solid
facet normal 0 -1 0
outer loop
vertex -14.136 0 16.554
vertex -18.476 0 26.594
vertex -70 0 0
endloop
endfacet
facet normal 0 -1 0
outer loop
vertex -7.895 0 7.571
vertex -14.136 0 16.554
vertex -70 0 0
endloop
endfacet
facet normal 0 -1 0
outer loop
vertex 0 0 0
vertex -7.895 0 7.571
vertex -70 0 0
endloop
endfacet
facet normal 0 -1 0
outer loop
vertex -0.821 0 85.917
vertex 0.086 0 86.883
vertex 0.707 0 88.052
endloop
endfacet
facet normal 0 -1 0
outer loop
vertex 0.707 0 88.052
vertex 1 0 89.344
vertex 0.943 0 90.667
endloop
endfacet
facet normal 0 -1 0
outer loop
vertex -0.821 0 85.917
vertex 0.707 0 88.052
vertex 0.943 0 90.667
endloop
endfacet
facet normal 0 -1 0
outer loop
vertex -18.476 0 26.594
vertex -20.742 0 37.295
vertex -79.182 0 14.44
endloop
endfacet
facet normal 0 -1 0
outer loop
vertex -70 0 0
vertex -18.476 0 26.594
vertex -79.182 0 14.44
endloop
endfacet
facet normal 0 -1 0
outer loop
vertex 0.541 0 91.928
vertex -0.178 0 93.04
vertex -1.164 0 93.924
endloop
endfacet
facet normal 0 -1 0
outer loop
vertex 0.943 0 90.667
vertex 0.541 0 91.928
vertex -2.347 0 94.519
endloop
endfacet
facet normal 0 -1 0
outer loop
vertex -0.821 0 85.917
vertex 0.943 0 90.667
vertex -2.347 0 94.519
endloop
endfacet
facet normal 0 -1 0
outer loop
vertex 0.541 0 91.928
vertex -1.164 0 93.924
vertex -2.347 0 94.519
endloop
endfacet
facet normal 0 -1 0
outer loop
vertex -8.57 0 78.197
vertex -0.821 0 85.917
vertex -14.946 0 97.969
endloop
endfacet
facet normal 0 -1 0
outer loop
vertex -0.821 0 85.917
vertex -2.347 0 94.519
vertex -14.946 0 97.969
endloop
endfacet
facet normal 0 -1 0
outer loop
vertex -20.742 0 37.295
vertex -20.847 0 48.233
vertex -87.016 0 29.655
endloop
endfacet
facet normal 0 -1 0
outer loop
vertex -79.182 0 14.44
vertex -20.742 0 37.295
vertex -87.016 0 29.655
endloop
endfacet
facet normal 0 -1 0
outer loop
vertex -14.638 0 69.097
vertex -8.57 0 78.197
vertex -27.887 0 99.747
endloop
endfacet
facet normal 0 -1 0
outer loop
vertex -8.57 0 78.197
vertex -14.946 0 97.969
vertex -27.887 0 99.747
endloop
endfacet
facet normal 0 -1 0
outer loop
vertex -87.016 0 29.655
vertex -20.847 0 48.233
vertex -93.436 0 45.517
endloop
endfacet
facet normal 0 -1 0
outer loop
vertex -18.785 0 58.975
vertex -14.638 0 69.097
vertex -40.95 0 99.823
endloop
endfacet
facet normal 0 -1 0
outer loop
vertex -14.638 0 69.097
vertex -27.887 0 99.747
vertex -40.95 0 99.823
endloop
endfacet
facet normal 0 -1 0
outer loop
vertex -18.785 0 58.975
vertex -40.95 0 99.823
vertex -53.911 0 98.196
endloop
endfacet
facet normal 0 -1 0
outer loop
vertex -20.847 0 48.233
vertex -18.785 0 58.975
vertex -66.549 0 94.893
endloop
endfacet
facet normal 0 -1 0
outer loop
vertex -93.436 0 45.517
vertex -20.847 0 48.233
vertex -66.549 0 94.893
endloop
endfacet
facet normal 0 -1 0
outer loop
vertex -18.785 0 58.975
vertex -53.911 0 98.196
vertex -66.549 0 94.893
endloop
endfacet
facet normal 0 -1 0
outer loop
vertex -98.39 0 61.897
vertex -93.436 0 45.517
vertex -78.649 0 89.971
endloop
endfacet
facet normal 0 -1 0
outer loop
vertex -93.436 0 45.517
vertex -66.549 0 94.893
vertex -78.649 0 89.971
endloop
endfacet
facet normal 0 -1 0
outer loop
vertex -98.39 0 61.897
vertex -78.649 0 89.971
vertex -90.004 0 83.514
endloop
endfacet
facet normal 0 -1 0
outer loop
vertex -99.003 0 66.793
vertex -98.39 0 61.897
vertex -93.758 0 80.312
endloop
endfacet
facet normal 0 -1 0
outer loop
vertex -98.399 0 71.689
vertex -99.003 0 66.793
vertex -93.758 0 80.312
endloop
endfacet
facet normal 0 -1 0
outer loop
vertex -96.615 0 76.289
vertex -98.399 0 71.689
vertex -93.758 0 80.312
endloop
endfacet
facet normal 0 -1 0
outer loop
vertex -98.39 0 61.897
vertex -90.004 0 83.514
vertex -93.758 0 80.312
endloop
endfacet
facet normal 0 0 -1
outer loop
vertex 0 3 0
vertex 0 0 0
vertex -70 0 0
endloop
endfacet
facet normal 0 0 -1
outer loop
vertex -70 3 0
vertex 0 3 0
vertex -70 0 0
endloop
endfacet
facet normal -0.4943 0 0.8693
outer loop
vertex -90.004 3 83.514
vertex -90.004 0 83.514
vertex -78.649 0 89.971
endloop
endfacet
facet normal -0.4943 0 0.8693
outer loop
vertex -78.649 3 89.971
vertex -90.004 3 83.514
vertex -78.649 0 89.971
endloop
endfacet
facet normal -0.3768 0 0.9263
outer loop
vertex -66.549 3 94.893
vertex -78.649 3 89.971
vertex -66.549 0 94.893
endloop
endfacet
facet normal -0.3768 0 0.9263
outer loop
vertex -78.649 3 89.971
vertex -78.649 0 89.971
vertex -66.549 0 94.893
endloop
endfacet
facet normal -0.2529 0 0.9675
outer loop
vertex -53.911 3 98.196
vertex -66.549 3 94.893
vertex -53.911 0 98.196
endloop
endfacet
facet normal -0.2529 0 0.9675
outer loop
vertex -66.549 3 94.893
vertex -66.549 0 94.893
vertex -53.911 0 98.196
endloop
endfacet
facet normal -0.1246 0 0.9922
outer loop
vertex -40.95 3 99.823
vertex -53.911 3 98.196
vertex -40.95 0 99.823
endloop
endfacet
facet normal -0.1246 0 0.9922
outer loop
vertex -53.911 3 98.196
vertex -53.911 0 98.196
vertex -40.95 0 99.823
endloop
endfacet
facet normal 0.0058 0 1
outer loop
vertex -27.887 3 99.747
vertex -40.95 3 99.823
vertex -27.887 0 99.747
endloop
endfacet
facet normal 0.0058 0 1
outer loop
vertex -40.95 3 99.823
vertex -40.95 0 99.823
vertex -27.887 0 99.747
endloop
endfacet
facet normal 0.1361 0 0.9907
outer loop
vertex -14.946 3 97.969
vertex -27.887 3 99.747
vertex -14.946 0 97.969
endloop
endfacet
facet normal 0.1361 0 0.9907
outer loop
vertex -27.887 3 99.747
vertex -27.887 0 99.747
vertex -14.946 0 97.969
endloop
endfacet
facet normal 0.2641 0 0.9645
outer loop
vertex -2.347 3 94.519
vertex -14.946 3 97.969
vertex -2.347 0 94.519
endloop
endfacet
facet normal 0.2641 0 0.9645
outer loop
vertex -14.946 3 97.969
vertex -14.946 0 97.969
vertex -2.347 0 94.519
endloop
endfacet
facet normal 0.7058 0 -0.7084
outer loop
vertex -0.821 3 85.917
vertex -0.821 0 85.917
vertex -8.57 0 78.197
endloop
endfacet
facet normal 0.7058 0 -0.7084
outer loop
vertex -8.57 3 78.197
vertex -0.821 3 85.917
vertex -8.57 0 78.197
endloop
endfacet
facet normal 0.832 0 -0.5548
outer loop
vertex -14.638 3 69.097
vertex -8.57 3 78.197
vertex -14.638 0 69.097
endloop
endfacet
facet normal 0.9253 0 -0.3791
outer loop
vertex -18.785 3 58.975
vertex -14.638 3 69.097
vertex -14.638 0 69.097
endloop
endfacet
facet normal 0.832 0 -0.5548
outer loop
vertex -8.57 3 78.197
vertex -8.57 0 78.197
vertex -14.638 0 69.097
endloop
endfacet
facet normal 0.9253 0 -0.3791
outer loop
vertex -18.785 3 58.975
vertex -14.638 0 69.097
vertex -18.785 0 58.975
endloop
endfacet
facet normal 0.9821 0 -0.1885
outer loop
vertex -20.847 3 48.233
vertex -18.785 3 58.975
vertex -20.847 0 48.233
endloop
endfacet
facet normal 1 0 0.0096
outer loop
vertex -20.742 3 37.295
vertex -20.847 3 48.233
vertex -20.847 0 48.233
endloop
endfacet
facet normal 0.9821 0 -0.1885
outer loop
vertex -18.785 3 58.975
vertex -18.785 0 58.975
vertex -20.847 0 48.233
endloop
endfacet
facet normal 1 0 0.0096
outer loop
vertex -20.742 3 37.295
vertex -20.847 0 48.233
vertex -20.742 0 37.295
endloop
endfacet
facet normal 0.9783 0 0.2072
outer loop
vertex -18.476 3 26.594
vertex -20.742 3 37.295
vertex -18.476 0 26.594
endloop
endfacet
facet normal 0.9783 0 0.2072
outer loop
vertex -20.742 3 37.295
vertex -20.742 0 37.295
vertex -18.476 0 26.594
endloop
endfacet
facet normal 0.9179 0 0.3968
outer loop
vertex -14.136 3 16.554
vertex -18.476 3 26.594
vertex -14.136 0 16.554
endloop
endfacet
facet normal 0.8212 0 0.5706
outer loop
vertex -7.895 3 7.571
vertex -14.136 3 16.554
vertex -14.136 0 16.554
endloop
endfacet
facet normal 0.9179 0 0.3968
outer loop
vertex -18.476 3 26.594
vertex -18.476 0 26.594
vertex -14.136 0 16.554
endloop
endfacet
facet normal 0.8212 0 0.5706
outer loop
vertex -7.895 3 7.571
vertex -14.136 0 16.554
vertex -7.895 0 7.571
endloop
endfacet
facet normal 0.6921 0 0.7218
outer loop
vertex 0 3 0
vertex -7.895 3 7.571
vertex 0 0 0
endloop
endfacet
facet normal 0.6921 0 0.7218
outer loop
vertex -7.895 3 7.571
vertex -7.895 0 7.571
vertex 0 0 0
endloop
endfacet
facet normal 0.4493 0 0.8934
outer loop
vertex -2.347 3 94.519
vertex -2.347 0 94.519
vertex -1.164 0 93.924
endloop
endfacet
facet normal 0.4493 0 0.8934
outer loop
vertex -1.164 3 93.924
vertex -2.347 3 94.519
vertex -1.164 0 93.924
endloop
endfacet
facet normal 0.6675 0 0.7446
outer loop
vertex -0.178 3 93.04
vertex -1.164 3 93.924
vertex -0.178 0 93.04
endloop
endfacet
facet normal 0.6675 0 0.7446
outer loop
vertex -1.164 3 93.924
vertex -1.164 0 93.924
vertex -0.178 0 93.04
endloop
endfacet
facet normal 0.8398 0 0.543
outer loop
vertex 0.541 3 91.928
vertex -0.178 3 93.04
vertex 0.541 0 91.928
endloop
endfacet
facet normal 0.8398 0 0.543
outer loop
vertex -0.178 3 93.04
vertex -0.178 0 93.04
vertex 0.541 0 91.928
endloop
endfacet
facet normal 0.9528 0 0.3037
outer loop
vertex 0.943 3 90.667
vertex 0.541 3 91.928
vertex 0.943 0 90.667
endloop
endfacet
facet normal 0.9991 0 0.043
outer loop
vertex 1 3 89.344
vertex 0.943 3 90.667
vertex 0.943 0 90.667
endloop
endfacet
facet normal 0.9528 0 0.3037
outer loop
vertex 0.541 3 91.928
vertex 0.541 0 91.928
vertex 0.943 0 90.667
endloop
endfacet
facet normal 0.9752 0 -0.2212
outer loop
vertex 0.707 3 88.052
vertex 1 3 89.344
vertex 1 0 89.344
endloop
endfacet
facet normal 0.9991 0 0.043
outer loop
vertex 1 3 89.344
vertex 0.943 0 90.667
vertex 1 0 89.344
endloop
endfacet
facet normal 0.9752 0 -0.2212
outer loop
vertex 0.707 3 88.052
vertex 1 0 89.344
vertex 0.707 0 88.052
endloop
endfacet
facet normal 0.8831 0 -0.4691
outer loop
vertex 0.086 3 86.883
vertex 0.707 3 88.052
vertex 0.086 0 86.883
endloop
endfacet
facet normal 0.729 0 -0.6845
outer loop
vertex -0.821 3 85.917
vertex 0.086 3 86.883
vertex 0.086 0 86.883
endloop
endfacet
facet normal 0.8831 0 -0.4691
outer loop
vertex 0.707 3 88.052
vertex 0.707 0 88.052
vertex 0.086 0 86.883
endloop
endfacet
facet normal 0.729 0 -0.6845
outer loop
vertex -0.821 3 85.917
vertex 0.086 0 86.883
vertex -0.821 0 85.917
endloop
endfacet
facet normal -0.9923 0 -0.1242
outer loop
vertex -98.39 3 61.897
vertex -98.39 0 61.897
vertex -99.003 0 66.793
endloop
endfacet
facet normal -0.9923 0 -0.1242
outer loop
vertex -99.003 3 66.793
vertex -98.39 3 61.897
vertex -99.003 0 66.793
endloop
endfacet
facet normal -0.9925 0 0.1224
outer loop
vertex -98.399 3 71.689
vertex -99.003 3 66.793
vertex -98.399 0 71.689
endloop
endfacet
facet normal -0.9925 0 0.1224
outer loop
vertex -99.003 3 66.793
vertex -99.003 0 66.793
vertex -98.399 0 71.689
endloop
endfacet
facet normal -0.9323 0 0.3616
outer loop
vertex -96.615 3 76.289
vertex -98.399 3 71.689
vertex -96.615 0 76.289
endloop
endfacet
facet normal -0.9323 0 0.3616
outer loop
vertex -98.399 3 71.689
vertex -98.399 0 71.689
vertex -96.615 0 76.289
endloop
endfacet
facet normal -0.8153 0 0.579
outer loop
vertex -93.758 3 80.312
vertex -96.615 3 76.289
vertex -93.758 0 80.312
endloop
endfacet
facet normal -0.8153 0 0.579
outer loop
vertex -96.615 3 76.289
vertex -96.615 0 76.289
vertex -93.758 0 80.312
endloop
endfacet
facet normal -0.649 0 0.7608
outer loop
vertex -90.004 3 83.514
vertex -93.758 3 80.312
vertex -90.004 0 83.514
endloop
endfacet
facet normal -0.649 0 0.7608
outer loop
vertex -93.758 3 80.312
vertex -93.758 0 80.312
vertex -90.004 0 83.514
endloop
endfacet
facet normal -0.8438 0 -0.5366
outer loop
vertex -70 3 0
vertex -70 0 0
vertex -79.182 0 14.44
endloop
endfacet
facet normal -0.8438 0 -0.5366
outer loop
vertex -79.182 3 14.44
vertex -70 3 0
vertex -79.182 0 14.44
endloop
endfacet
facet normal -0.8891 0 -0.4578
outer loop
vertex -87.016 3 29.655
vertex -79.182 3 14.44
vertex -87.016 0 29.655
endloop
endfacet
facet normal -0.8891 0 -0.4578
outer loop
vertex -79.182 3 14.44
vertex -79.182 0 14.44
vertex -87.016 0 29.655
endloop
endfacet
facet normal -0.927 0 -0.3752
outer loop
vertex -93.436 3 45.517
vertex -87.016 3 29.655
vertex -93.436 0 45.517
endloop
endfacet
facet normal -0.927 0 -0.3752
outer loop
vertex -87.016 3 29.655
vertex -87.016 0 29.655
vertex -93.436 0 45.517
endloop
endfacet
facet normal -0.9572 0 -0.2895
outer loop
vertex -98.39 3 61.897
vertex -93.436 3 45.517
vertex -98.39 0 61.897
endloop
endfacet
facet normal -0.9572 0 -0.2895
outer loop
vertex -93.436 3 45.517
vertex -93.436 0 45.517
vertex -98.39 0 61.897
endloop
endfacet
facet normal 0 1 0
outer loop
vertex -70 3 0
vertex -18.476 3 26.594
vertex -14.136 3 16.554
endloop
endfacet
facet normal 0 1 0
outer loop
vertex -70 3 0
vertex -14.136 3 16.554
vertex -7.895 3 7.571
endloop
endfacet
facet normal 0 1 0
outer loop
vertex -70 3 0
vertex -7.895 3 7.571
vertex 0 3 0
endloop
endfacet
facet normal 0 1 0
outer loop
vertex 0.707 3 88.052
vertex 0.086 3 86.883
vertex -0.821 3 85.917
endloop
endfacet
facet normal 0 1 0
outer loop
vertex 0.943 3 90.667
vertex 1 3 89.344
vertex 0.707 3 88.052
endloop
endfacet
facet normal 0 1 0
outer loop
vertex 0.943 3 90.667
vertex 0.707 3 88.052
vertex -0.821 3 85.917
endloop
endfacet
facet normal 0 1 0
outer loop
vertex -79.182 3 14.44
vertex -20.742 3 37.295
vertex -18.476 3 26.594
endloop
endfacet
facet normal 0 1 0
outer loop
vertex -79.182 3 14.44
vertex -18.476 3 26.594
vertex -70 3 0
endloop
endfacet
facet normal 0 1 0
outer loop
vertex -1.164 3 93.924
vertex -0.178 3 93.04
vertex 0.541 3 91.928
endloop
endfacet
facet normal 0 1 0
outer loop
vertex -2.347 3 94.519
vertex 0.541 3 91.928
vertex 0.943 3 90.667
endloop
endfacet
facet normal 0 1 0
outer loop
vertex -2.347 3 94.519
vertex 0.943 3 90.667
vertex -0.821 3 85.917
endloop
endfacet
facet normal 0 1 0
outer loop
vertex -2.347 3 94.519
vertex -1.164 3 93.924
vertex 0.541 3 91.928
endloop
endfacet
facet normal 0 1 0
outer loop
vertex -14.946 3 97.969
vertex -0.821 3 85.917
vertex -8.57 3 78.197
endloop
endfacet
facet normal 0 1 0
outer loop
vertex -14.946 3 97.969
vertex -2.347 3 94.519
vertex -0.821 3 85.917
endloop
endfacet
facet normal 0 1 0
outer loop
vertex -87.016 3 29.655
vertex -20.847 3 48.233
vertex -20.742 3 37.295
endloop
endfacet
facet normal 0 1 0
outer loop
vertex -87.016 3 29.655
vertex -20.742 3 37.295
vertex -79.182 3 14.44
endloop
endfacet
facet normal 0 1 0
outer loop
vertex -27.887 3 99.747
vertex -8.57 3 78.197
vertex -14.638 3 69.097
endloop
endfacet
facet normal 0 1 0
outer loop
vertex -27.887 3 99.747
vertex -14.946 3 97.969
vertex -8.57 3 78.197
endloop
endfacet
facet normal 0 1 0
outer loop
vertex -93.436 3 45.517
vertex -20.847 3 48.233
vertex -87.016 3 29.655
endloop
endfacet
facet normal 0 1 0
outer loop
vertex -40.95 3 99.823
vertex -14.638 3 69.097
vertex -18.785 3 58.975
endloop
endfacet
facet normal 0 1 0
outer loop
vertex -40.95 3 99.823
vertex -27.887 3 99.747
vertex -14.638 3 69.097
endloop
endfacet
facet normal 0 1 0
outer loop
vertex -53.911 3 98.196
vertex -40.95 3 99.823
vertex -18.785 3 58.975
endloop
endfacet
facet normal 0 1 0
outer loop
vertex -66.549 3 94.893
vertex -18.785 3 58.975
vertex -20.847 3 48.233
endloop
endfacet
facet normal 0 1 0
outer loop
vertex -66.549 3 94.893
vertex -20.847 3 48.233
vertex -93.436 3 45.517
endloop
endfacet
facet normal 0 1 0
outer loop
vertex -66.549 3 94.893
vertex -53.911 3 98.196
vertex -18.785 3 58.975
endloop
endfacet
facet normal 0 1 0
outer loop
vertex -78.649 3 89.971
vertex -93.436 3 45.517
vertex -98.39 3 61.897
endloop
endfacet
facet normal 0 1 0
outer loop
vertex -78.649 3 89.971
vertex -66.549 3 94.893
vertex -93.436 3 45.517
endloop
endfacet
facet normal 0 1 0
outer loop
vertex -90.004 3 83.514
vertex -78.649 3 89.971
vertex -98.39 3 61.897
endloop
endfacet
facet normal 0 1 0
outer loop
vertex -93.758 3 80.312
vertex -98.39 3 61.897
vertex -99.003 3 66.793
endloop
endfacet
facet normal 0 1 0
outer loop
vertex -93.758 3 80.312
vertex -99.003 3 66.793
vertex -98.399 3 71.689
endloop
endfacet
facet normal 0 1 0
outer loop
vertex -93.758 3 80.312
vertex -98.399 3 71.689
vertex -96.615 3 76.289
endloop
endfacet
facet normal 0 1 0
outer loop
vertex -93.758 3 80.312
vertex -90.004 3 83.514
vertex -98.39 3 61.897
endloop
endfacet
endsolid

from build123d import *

# Parameters (mm, degrees)
BOSS_EXTRUDE1_DEPTH = 3


with BuildPart() as part:
    # Sketch2 → Boss-Extrude1 (new body)
    with BuildSketch(Plane(origin=(0, 0, 0), x_dir=(-1, 0, 0), z_dir=(0, 1, 0))):
        with BuildLine():
            Line((0, 0), (70, 0))
            ThreePointArc((70, 0), (87.015622115, 29.654658201), (98.389955297, 61.896784273))
            ThreePointArc((98.389955297, 61.896784273), (97.649210784, 74.044604409), (90.003901507, 83.513895964))
            ThreePointArc((90.003901507, 83.513895964), (47.456729901, 99.2211161), (2.347235642, 94.518765226))
            ThreePointArc((2.347235642, 94.518765226), (-0.943195566, 90.666547418), (0.820695537, 85.917315086))
            ThreePointArc((0.820695537, 85.917315086), (21.067224953, 42.761339844), (0, 0))
        make_face()
    extrude(amount=BOSS_EXTRUDE1_DEPTH)


solid = part.part
